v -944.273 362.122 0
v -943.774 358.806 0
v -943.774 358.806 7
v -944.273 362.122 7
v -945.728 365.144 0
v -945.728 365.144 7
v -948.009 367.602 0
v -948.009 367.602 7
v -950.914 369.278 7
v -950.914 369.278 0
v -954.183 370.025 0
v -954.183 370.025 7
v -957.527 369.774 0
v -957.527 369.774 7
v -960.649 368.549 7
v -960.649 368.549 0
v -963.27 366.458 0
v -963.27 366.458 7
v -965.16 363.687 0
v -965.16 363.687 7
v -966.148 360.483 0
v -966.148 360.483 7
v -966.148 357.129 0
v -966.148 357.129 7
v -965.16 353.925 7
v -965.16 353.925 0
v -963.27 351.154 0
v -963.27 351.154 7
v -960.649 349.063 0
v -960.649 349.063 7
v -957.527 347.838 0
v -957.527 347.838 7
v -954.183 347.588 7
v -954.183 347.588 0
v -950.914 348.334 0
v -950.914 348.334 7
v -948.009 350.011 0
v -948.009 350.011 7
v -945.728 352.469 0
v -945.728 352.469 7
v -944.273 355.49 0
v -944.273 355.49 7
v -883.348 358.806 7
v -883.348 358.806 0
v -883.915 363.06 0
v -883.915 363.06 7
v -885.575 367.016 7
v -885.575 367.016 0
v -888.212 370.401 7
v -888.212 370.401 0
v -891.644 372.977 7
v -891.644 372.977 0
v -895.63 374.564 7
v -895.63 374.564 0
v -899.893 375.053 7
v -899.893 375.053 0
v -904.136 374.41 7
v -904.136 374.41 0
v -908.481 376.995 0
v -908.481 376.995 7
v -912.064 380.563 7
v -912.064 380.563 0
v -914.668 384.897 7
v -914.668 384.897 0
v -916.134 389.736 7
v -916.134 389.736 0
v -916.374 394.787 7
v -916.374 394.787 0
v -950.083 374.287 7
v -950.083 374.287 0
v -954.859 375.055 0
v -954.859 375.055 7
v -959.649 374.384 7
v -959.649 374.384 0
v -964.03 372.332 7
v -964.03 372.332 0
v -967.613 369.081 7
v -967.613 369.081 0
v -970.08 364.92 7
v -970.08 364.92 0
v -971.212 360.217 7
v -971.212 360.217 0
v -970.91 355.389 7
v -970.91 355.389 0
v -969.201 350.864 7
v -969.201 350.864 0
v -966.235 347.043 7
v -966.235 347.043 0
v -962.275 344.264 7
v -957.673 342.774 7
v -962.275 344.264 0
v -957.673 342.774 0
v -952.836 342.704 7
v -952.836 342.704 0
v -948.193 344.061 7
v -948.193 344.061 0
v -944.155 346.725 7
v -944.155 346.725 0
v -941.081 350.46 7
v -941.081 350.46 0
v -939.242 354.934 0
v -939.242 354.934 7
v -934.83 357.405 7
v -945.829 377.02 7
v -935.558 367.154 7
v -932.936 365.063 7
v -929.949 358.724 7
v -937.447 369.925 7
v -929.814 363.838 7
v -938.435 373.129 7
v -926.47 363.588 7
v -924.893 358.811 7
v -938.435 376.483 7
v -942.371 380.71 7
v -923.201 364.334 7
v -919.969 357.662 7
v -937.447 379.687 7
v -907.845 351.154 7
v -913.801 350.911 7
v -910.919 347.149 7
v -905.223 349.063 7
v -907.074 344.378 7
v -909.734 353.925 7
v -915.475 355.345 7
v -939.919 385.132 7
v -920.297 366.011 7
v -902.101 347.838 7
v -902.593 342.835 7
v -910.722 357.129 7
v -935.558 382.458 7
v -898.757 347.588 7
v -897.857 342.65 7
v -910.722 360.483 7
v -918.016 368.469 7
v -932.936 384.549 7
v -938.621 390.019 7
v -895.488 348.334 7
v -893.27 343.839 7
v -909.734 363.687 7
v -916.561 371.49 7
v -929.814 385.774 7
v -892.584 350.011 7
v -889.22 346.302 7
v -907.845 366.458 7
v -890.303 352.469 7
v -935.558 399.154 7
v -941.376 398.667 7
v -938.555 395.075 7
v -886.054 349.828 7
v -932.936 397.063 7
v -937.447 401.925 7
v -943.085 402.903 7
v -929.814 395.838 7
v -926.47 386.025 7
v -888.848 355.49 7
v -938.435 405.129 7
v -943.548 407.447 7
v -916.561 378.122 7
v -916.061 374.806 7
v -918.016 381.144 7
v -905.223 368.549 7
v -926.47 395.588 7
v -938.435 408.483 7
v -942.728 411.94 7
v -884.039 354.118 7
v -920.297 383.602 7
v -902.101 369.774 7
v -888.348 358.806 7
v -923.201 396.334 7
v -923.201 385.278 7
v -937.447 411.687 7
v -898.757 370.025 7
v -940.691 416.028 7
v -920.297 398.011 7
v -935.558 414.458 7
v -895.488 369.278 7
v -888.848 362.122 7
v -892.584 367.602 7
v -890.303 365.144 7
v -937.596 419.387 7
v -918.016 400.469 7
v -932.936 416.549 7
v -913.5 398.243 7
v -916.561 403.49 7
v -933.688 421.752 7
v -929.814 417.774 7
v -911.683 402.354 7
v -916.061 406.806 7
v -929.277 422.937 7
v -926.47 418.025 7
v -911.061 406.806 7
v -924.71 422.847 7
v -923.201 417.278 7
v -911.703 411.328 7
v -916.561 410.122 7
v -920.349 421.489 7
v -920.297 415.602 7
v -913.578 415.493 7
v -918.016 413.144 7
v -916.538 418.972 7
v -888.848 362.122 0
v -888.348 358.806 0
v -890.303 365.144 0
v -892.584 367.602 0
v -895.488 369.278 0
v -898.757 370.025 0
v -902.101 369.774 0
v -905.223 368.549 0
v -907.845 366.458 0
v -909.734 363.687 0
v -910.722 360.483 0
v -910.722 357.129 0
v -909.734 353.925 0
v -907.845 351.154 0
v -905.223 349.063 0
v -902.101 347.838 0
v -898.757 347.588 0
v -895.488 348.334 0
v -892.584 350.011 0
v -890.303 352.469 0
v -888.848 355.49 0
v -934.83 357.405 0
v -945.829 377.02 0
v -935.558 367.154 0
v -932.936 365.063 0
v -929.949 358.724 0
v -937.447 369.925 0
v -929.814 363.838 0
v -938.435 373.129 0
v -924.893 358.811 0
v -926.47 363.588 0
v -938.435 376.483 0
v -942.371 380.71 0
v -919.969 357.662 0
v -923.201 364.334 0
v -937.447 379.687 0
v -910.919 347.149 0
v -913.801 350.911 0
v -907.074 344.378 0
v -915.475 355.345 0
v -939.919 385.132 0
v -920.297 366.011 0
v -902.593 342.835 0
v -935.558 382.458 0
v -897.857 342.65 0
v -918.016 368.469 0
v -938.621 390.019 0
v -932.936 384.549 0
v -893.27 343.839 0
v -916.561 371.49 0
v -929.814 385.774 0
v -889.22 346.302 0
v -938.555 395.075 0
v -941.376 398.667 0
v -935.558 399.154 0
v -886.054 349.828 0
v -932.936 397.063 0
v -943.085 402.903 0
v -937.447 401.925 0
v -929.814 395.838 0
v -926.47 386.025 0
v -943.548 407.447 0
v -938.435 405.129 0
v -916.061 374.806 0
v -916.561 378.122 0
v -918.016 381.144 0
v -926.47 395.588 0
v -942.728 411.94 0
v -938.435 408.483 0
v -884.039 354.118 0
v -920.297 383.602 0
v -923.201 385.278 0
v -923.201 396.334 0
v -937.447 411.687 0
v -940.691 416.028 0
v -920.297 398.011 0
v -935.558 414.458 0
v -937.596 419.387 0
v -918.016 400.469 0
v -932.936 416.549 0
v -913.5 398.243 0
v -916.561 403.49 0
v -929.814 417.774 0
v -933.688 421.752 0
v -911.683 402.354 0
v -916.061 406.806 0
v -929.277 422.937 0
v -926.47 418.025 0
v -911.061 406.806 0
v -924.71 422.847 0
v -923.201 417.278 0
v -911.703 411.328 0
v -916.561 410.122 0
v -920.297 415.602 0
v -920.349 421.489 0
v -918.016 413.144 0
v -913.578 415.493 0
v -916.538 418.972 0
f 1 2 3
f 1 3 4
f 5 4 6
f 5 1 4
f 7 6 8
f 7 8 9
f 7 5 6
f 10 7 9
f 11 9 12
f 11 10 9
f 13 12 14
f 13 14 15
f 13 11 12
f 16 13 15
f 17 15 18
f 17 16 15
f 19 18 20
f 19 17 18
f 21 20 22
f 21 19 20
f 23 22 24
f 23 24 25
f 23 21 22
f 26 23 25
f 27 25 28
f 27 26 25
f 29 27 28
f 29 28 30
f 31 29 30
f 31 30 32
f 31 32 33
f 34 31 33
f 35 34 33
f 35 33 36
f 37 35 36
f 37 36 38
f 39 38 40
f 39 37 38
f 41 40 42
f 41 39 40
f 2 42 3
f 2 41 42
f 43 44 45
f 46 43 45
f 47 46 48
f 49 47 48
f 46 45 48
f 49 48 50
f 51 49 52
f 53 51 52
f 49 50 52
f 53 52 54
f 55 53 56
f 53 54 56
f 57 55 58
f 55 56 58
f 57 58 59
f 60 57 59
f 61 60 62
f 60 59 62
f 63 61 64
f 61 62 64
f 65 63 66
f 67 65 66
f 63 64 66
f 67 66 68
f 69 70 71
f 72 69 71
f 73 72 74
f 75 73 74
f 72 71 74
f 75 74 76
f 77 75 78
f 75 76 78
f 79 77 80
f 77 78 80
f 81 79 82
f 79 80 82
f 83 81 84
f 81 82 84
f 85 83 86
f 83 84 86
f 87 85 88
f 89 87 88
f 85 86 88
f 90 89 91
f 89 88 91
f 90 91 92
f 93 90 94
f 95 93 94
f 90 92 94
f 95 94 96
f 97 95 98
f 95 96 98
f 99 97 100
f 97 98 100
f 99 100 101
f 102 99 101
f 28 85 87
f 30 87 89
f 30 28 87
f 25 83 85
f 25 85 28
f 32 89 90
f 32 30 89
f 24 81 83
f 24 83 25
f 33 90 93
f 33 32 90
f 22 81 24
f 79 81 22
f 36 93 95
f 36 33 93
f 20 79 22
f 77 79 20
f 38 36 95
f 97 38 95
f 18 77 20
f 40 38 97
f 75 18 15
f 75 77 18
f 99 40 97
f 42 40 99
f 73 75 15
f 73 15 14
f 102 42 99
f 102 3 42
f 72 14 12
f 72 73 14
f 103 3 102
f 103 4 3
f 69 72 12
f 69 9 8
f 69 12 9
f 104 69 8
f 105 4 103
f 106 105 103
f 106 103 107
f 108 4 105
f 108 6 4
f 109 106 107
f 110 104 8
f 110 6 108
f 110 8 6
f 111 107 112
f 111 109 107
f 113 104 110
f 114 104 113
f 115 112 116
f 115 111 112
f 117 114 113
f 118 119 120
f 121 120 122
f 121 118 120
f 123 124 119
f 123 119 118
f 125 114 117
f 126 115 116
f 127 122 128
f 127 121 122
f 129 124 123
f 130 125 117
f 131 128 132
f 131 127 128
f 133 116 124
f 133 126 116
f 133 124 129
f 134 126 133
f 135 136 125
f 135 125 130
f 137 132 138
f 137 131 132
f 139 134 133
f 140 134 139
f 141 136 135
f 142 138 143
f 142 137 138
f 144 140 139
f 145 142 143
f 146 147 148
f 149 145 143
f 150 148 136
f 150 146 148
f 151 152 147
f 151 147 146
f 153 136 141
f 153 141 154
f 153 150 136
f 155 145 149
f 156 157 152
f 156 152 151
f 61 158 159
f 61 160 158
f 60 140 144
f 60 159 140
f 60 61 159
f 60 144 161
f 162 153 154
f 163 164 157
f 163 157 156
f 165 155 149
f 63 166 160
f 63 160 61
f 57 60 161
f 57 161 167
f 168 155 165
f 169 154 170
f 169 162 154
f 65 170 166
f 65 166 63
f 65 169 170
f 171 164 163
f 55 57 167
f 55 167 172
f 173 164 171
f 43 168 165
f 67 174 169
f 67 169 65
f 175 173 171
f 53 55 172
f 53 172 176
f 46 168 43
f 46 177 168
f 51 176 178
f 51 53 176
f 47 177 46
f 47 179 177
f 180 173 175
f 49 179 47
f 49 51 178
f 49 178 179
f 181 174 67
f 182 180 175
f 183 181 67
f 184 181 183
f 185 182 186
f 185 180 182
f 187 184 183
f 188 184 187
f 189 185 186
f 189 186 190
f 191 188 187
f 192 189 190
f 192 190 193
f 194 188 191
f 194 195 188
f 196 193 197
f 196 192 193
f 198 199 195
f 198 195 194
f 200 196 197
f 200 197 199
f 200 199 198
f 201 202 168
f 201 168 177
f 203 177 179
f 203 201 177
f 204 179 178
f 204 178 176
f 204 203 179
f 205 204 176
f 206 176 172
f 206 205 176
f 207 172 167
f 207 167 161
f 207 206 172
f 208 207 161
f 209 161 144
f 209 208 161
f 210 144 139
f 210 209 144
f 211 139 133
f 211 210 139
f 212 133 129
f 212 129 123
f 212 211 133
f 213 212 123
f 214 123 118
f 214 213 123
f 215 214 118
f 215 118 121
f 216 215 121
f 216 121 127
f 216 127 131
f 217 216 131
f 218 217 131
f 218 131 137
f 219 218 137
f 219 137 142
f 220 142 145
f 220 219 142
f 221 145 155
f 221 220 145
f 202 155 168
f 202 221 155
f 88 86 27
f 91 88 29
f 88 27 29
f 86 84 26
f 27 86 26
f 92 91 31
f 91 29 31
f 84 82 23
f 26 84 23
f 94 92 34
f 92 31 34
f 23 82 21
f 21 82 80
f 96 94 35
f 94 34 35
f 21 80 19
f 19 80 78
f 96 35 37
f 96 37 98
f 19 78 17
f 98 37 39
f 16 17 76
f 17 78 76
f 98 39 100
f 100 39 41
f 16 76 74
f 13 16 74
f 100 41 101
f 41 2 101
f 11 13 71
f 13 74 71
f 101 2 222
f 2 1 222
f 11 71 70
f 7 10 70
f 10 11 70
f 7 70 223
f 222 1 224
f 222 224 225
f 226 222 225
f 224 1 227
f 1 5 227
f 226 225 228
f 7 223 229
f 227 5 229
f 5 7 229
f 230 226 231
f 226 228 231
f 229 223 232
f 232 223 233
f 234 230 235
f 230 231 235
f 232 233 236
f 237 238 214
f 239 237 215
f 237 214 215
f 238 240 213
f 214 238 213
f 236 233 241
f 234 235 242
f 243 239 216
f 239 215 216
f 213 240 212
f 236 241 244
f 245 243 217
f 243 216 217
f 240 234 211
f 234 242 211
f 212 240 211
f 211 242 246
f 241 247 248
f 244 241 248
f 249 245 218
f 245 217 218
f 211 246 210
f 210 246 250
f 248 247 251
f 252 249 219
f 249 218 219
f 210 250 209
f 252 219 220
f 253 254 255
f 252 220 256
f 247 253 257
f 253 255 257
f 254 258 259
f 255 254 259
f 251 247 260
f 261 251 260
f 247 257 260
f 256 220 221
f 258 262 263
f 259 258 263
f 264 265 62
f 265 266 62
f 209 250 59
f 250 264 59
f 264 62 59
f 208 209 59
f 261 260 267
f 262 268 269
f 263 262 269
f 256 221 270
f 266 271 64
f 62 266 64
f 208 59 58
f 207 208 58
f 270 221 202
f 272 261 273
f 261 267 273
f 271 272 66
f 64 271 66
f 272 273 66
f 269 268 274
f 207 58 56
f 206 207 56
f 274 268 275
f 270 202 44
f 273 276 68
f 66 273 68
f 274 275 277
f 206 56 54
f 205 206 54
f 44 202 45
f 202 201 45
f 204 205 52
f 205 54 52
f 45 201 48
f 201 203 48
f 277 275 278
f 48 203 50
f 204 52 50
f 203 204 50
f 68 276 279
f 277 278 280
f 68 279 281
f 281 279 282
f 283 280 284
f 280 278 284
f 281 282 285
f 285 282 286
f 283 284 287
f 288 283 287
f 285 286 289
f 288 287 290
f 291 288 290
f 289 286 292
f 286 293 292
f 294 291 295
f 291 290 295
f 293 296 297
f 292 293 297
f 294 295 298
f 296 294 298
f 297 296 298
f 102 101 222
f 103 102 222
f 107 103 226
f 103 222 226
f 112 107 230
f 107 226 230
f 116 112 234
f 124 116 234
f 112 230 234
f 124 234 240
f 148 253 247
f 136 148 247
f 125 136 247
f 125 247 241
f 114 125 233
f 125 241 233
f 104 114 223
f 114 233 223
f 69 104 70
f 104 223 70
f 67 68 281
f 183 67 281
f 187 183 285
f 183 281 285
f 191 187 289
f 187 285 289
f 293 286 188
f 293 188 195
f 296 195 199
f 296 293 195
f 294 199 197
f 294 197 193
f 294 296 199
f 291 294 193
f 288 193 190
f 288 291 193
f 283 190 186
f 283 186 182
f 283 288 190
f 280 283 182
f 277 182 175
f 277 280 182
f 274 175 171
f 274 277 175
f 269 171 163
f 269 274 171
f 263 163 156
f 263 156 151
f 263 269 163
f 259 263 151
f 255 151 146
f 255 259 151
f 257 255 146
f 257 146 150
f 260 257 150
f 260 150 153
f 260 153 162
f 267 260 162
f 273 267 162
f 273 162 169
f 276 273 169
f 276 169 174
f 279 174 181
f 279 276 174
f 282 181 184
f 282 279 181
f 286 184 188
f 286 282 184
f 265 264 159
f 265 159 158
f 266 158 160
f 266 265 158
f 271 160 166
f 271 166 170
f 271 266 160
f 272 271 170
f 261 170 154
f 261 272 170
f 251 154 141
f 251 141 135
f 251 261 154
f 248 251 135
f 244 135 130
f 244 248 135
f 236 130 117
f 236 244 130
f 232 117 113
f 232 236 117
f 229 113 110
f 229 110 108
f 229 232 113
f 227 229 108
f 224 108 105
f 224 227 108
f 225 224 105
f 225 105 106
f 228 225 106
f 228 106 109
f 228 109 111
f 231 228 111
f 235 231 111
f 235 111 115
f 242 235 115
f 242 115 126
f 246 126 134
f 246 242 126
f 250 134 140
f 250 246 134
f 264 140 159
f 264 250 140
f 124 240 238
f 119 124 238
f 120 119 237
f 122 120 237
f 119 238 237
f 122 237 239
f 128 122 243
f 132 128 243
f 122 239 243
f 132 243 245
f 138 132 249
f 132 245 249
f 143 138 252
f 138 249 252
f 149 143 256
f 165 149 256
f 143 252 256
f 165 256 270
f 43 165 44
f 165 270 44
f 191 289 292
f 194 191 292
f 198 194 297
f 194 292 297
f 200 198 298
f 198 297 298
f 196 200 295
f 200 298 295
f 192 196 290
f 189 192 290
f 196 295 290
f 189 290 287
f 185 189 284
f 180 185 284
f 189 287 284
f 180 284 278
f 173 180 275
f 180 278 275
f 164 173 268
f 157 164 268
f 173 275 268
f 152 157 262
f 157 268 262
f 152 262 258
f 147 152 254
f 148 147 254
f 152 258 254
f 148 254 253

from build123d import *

# Parameters (mm, degrees)
F0_R     = 11.25
F1_DEPTH = 7


with BuildPart() as f1:
    # F0 (on Top) → F1 (new body)
    with BuildSketch(Plane.XY):
        with BuildLine():
            ThreePointArc((-911.060802, 406.806157), (-933.68826, 421.752412), (-938.555022, 395.074575))
            ThreePointArc((-938.555022, 395.074575), (-927.521425, 390.557522), (-916.374451, 394.787059))
            ThreePointArc((-916.374451, 394.787059), (-912.448464, 400.235511), (-911.060802, 406.806157))
        make_face()
        with Locations((-927.310802, 406.806157)):
            Circle(F0_R, mode=Mode.SUBTRACT)
        with BuildLine():
            ThreePointArc((-950.082946, 374.286864), (-941.902099, 368.391997), (-938.773615, 358.806157))
            ThreePointArc((-938.773615, 358.806157), (-938.89105, 356.85607), (-939.241657, 354.934168))
            ThreePointArc((-939.241657, 354.934168), (-927.423679, 358.923807), (-915.475009, 355.344548))
            ThreePointArc((-915.475009, 355.344548), (-913.564408, 367.11288), (-904.135728, 374.409728))
            ThreePointArc((-904.135728, 374.409728), (-913.499845, 382.649578), (-916.374451, 394.787059))
            ThreePointArc((-916.374451, 394.787059), (-927.521425, 390.557522), (-938.555022, 395.074575))
            ThreePointArc((-938.555022, 395.074575), (-941.008882, 382.845087), (-950.082946, 374.286864))
        make_face()
        with Locations((-927.310802, 374.806157)):
            Circle(F0_R, mode=Mode.SUBTRACT)
        with BuildLine():
            ThreePointArc((-904.135728, 374.409728), (-913.564408, 367.11288), (-915.475009, 355.344548))
            ThreePointArc((-915.475009, 355.344548), (-897.857167, 342.649671), (-883.347989, 358.806157))
            ThreePointArc((-883.347989, 358.806157), (-889.842881, 371.802325), (-904.135728, 374.409728))
        make_face()
        with Locations((-899.597989, 358.806157)):
            Circle(F0_R, mode=Mode.SUBTRACT)
        with BuildLine():
            ThreePointArc((-939.241657, 354.934168), (-938.89105, 356.85607), (-938.773615, 358.806157))
            ThreePointArc((-938.773615, 358.806157), (-941.902099, 368.391997), (-950.082946, 374.286864))
            ThreePointArc((-950.082946, 374.286864), (-969.200657, 350.864245), (-939.241657, 354.934168))
        make_face()
        with Locations((-955.023615, 358.806157)):
            Circle(F0_R, mode=Mode.SUBTRACT)
    extrude(amount=F1_DEPTH)


solid = f1.part
